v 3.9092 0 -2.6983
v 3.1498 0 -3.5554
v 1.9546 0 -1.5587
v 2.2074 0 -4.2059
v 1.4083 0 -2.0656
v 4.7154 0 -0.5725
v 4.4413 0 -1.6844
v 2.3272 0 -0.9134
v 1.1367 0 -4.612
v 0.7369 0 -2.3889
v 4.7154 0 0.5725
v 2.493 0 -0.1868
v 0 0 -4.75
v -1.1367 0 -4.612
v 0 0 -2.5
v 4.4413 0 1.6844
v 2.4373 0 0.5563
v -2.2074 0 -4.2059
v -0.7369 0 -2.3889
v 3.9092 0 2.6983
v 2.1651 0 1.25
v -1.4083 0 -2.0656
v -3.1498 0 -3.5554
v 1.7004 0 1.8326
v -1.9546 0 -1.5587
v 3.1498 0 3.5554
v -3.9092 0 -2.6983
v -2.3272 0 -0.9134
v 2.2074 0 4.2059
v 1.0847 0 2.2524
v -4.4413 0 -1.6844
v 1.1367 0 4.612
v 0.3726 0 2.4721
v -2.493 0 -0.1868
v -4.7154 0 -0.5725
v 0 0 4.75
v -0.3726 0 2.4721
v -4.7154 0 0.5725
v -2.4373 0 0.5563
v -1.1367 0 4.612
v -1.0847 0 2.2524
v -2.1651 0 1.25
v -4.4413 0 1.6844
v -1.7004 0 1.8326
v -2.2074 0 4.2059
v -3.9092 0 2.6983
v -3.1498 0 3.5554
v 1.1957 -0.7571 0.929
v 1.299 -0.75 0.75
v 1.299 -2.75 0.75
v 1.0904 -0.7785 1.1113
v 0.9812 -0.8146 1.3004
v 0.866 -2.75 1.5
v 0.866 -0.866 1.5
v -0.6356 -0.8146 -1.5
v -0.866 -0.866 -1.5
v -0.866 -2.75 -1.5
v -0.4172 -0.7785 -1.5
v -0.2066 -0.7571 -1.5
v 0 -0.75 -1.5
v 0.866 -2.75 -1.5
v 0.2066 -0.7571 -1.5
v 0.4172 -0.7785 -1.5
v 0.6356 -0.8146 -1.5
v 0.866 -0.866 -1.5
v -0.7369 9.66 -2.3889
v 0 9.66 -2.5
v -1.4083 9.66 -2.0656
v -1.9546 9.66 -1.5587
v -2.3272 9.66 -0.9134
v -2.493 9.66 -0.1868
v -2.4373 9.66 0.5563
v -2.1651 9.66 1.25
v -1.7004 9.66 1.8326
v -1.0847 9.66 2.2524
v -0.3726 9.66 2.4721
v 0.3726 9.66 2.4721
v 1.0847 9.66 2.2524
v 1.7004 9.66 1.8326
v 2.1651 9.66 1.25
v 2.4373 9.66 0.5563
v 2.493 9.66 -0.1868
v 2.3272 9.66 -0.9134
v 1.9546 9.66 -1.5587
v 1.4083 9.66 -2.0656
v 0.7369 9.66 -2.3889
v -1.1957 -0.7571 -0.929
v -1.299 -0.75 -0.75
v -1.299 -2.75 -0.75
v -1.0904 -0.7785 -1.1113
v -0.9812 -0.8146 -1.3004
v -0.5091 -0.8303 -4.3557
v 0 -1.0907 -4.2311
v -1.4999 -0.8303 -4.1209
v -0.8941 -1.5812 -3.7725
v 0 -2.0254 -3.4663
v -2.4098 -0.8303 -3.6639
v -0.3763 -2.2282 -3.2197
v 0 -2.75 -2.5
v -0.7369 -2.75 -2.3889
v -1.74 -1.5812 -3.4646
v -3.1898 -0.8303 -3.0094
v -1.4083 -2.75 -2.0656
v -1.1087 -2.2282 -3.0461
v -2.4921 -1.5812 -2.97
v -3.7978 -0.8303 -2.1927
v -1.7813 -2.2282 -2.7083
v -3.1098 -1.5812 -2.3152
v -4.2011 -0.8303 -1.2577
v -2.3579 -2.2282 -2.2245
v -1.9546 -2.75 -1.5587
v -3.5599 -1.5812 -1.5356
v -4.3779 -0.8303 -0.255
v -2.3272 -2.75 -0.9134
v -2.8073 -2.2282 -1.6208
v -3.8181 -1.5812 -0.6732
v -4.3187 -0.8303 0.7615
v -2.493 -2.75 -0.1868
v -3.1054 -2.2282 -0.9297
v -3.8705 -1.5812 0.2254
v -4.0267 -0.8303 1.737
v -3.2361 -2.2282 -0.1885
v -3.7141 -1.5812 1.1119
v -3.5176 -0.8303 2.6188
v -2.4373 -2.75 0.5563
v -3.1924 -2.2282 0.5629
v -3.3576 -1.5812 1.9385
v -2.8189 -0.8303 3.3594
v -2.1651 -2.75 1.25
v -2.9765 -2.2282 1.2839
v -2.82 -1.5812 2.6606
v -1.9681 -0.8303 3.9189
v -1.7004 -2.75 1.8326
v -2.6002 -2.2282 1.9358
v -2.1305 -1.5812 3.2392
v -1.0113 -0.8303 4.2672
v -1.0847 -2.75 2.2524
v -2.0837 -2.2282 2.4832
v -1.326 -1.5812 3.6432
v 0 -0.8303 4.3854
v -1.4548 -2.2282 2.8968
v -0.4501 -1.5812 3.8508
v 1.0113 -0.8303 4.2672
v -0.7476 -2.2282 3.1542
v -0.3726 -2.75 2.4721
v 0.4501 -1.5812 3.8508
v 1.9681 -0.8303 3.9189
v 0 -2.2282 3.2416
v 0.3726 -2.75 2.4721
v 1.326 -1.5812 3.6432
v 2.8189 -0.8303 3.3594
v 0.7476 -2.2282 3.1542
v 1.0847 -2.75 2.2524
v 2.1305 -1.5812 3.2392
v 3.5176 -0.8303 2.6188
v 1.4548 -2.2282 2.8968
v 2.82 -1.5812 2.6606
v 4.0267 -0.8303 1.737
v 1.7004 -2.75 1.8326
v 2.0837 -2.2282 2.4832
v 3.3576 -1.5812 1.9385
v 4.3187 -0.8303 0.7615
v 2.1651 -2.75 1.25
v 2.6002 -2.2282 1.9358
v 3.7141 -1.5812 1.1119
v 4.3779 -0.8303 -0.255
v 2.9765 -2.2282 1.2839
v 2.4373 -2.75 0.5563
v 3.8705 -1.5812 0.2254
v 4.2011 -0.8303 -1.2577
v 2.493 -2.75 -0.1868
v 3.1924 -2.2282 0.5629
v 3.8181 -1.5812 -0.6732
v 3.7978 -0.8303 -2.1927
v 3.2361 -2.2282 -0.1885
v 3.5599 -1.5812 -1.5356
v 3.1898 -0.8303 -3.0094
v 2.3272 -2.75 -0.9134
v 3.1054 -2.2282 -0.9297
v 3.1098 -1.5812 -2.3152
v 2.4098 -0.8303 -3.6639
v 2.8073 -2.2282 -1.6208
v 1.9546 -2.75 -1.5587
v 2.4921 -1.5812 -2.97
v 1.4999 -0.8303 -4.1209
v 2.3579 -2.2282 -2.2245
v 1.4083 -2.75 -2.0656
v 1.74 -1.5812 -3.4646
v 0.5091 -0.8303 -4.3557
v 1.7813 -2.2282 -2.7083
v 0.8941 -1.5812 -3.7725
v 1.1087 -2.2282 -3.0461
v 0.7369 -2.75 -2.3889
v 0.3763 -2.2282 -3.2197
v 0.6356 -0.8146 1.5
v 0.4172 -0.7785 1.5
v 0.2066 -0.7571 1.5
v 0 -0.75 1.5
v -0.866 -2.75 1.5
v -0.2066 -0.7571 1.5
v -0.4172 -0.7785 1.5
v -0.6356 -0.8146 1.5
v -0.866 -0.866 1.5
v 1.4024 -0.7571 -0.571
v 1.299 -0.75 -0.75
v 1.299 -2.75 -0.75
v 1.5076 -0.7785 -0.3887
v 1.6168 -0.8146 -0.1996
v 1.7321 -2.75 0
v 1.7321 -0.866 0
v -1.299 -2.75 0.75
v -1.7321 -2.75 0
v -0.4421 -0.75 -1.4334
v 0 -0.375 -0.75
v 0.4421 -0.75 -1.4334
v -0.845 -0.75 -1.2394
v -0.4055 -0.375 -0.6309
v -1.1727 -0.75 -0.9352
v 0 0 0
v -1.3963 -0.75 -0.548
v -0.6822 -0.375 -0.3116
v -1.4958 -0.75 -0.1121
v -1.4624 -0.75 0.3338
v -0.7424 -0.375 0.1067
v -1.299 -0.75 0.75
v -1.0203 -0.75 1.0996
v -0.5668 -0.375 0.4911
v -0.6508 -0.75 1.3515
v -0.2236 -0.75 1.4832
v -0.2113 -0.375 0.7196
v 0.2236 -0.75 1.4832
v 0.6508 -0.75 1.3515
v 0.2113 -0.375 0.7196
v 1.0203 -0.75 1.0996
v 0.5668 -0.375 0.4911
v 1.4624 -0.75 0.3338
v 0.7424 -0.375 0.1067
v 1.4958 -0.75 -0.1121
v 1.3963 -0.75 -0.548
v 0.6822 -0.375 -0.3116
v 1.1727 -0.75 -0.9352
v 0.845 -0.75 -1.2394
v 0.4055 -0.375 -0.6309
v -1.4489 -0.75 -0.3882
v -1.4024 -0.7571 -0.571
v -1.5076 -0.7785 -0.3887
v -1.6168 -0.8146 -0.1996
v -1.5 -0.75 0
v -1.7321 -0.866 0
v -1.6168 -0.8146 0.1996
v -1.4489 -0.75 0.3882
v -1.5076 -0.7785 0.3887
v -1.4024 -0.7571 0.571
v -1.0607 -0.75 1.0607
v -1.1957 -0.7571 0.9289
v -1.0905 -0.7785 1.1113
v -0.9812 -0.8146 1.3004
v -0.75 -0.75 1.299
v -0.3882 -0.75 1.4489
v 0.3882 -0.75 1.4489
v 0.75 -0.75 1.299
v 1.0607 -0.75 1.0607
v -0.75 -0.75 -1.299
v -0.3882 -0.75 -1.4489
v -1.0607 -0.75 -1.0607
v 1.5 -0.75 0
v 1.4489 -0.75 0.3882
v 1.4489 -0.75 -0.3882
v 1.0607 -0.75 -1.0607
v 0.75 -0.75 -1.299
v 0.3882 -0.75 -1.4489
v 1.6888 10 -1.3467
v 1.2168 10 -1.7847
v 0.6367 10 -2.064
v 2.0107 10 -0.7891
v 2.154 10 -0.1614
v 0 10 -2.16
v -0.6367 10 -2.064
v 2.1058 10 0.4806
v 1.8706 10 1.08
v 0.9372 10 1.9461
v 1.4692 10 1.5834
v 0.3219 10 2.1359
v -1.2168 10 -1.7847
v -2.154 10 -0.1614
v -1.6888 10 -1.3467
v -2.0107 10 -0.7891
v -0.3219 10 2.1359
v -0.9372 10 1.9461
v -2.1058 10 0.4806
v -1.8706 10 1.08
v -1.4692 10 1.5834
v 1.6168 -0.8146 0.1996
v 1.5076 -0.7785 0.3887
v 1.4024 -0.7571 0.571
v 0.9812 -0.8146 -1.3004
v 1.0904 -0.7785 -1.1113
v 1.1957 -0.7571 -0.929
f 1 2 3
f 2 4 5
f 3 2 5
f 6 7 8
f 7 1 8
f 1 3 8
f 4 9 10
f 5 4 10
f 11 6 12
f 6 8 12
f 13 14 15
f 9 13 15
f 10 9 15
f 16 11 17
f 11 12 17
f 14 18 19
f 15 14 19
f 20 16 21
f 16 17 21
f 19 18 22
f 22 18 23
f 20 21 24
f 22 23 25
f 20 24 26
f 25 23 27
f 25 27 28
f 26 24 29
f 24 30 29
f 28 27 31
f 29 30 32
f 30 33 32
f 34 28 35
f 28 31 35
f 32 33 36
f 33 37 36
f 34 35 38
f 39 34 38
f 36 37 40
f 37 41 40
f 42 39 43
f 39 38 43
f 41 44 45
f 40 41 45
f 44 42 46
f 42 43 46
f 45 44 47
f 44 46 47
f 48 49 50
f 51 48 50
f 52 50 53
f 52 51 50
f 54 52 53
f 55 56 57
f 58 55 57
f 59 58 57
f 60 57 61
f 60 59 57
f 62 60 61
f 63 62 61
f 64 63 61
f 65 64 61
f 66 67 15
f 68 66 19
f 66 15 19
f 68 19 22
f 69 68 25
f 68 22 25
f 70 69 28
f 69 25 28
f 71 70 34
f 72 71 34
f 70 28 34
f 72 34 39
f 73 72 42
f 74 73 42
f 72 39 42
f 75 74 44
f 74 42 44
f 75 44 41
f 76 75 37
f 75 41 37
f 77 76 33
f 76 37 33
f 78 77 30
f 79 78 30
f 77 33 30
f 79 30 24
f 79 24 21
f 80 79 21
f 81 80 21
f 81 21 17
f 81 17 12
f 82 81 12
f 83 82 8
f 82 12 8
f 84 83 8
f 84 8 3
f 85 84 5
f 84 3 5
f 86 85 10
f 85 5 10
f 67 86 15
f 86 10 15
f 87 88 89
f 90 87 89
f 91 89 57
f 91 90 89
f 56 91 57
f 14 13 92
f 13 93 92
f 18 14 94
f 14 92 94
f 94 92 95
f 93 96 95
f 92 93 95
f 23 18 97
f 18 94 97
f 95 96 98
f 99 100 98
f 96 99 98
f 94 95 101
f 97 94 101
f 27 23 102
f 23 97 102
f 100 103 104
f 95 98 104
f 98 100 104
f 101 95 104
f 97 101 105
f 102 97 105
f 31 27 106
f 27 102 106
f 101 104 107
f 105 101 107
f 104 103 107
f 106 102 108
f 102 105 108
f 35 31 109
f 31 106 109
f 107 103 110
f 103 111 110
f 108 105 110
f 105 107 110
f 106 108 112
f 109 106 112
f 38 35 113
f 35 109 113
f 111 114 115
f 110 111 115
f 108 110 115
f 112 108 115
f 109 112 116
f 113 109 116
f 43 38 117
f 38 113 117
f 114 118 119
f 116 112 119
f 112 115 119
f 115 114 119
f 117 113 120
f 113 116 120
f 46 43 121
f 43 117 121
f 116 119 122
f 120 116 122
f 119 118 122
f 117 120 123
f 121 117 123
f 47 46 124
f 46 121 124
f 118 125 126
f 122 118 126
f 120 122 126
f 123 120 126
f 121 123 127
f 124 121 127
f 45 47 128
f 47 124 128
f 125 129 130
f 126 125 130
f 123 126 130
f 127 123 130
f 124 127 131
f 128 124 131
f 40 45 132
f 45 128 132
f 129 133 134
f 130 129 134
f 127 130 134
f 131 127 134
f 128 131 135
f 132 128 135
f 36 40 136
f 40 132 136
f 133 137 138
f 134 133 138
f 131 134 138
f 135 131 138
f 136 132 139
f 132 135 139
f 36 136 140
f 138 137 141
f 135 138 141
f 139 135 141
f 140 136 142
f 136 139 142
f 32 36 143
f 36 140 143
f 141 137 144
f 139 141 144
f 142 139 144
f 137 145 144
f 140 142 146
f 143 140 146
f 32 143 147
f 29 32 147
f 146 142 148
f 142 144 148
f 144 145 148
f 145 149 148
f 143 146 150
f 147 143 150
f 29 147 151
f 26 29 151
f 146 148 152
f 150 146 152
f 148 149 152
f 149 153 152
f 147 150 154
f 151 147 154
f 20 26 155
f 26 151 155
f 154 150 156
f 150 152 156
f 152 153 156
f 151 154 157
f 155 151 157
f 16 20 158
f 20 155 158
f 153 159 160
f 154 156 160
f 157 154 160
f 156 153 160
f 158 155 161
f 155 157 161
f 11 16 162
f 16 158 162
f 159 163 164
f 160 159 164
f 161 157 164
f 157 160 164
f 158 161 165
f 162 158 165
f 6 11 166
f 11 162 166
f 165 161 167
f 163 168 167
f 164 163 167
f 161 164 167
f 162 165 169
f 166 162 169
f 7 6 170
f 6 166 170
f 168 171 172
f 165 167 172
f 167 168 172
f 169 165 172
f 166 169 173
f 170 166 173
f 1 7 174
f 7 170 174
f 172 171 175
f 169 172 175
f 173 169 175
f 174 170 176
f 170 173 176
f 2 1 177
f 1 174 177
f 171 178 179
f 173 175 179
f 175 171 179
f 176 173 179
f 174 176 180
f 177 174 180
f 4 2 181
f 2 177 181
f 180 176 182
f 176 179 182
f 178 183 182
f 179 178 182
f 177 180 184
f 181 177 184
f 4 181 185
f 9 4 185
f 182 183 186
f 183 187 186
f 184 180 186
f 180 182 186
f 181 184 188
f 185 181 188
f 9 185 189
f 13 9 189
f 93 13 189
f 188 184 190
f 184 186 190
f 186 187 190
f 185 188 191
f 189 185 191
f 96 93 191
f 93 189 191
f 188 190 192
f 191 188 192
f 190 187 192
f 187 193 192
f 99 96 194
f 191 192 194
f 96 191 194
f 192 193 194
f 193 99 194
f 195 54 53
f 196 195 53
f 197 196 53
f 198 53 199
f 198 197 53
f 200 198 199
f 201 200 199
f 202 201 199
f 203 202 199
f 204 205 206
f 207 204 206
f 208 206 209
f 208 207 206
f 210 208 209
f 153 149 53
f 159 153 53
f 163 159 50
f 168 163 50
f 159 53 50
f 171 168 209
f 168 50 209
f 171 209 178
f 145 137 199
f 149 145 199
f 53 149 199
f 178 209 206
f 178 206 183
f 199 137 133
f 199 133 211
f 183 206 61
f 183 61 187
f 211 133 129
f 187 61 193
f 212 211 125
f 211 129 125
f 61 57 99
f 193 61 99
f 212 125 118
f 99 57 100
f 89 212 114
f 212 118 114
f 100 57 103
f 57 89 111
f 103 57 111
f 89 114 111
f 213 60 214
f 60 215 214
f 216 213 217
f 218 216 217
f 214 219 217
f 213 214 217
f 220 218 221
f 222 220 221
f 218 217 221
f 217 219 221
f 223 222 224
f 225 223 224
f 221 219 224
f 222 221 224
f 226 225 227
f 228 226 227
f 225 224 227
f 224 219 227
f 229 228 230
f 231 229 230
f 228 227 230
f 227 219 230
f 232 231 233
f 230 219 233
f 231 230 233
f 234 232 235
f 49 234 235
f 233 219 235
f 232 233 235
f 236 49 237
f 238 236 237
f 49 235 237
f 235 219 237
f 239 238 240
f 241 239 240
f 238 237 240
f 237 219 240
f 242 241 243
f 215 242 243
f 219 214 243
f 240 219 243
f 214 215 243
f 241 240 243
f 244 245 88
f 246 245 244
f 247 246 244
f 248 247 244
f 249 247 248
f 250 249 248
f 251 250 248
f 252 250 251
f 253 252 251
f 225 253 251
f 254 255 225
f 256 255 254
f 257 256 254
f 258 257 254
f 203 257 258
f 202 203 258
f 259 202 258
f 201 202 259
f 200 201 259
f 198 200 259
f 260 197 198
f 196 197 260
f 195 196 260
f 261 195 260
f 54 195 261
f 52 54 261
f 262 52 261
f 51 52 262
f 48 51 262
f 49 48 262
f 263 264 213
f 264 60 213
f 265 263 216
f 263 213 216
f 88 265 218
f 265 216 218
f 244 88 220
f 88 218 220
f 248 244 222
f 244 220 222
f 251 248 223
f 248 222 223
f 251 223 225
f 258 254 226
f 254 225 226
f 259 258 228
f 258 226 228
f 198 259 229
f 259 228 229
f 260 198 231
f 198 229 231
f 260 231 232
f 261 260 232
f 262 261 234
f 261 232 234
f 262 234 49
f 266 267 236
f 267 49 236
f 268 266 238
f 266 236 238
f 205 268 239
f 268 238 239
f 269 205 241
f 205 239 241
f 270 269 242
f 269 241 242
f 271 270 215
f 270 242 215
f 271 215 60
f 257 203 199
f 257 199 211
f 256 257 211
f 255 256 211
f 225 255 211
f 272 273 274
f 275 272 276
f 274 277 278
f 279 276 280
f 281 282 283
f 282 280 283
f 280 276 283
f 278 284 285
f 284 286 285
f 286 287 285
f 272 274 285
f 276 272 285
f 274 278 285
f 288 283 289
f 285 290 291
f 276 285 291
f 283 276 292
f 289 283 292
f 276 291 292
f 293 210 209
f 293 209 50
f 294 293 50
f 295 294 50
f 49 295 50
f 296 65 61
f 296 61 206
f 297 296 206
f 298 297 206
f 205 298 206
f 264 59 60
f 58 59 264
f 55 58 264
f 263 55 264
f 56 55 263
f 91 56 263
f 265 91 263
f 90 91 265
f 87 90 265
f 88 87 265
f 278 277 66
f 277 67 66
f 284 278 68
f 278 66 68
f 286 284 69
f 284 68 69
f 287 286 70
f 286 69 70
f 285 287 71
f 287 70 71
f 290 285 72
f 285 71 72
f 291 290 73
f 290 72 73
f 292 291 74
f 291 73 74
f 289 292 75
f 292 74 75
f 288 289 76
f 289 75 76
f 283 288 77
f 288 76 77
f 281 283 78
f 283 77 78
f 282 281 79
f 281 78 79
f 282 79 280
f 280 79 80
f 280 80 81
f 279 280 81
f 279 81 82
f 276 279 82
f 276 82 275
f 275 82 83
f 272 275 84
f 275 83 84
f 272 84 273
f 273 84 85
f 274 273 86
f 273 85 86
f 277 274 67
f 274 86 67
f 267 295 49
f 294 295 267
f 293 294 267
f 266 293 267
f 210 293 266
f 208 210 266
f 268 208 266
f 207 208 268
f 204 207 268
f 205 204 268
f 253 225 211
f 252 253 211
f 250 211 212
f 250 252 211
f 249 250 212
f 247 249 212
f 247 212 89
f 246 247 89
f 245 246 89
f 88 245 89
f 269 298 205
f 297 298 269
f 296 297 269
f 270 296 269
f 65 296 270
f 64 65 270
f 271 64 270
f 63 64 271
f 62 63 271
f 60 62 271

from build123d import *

# Parameters (mm, degrees)
CUT_EXTRUDE_1_REACH = 16.411


with BuildPart() as part:
    # 草图1 → 旋转2 (revolve)
    with BuildSketch(Plane.XY):
        with BuildLine():
            Line((4.75, 0), (2.5, 0))
            Line((2.5, 0), (2.5, 9.66))
            Line((2.5, 9.66), (2.16, 10))
            Line((2.16, 10), (0, 10))
            Line((0, 10), (0, 0))
            Line((0, 0), (1.5, -0.75))
            Line((1.5, -0.75), (1.5, -2.75))
            Line((1.5, -2.75), (2.5, -2.75))
            ThreePointArc((2.5, -2.75), (3.877015605, -1.581194586), (4.75, 0))
        make_face()
    revolve(axis=Axis((0, 0, 0), (0, 1, 0)))

    # 切除-拉伸1: up to this cone (the profile starts inside it)
    cut_extrude_1_end = Plane(origin=(0, -2.75, 0), z_dir=(0, -1, 0)).offset(-2.749999) * Cone(2e-06, 50.322, 25.160999, align=(Align.CENTER, Align.CENTER, Align.MIN), mode=Mode.PRIVATE)
    # 草图2 → 切除-拉伸1 (cut, up to the surface)
    with BuildSketch(Plane.XZ.offset(2.75), mode=Mode.PRIVATE) as cut_extrude_1_sk1:
        Polygon((1.732050808, 0), (0.866025404, 1.5), (-0.866025404, 1.5), (-1.732050808, 0), (-0.866025404, -1.5), (0.866025404, -1.5), align=None)
    cut_extrude_1_tool1 = extrude(cut_extrude_1_sk1.sketch, amount=-CUT_EXTRUDE_1_REACH, mode=Mode.PRIVATE) & cut_extrude_1_end
    add(cut_extrude_1_tool1.solids().sort_by_distance((0, -2.75, 0))[0], mode=Mode.SUBTRACT)


solid = part.part
